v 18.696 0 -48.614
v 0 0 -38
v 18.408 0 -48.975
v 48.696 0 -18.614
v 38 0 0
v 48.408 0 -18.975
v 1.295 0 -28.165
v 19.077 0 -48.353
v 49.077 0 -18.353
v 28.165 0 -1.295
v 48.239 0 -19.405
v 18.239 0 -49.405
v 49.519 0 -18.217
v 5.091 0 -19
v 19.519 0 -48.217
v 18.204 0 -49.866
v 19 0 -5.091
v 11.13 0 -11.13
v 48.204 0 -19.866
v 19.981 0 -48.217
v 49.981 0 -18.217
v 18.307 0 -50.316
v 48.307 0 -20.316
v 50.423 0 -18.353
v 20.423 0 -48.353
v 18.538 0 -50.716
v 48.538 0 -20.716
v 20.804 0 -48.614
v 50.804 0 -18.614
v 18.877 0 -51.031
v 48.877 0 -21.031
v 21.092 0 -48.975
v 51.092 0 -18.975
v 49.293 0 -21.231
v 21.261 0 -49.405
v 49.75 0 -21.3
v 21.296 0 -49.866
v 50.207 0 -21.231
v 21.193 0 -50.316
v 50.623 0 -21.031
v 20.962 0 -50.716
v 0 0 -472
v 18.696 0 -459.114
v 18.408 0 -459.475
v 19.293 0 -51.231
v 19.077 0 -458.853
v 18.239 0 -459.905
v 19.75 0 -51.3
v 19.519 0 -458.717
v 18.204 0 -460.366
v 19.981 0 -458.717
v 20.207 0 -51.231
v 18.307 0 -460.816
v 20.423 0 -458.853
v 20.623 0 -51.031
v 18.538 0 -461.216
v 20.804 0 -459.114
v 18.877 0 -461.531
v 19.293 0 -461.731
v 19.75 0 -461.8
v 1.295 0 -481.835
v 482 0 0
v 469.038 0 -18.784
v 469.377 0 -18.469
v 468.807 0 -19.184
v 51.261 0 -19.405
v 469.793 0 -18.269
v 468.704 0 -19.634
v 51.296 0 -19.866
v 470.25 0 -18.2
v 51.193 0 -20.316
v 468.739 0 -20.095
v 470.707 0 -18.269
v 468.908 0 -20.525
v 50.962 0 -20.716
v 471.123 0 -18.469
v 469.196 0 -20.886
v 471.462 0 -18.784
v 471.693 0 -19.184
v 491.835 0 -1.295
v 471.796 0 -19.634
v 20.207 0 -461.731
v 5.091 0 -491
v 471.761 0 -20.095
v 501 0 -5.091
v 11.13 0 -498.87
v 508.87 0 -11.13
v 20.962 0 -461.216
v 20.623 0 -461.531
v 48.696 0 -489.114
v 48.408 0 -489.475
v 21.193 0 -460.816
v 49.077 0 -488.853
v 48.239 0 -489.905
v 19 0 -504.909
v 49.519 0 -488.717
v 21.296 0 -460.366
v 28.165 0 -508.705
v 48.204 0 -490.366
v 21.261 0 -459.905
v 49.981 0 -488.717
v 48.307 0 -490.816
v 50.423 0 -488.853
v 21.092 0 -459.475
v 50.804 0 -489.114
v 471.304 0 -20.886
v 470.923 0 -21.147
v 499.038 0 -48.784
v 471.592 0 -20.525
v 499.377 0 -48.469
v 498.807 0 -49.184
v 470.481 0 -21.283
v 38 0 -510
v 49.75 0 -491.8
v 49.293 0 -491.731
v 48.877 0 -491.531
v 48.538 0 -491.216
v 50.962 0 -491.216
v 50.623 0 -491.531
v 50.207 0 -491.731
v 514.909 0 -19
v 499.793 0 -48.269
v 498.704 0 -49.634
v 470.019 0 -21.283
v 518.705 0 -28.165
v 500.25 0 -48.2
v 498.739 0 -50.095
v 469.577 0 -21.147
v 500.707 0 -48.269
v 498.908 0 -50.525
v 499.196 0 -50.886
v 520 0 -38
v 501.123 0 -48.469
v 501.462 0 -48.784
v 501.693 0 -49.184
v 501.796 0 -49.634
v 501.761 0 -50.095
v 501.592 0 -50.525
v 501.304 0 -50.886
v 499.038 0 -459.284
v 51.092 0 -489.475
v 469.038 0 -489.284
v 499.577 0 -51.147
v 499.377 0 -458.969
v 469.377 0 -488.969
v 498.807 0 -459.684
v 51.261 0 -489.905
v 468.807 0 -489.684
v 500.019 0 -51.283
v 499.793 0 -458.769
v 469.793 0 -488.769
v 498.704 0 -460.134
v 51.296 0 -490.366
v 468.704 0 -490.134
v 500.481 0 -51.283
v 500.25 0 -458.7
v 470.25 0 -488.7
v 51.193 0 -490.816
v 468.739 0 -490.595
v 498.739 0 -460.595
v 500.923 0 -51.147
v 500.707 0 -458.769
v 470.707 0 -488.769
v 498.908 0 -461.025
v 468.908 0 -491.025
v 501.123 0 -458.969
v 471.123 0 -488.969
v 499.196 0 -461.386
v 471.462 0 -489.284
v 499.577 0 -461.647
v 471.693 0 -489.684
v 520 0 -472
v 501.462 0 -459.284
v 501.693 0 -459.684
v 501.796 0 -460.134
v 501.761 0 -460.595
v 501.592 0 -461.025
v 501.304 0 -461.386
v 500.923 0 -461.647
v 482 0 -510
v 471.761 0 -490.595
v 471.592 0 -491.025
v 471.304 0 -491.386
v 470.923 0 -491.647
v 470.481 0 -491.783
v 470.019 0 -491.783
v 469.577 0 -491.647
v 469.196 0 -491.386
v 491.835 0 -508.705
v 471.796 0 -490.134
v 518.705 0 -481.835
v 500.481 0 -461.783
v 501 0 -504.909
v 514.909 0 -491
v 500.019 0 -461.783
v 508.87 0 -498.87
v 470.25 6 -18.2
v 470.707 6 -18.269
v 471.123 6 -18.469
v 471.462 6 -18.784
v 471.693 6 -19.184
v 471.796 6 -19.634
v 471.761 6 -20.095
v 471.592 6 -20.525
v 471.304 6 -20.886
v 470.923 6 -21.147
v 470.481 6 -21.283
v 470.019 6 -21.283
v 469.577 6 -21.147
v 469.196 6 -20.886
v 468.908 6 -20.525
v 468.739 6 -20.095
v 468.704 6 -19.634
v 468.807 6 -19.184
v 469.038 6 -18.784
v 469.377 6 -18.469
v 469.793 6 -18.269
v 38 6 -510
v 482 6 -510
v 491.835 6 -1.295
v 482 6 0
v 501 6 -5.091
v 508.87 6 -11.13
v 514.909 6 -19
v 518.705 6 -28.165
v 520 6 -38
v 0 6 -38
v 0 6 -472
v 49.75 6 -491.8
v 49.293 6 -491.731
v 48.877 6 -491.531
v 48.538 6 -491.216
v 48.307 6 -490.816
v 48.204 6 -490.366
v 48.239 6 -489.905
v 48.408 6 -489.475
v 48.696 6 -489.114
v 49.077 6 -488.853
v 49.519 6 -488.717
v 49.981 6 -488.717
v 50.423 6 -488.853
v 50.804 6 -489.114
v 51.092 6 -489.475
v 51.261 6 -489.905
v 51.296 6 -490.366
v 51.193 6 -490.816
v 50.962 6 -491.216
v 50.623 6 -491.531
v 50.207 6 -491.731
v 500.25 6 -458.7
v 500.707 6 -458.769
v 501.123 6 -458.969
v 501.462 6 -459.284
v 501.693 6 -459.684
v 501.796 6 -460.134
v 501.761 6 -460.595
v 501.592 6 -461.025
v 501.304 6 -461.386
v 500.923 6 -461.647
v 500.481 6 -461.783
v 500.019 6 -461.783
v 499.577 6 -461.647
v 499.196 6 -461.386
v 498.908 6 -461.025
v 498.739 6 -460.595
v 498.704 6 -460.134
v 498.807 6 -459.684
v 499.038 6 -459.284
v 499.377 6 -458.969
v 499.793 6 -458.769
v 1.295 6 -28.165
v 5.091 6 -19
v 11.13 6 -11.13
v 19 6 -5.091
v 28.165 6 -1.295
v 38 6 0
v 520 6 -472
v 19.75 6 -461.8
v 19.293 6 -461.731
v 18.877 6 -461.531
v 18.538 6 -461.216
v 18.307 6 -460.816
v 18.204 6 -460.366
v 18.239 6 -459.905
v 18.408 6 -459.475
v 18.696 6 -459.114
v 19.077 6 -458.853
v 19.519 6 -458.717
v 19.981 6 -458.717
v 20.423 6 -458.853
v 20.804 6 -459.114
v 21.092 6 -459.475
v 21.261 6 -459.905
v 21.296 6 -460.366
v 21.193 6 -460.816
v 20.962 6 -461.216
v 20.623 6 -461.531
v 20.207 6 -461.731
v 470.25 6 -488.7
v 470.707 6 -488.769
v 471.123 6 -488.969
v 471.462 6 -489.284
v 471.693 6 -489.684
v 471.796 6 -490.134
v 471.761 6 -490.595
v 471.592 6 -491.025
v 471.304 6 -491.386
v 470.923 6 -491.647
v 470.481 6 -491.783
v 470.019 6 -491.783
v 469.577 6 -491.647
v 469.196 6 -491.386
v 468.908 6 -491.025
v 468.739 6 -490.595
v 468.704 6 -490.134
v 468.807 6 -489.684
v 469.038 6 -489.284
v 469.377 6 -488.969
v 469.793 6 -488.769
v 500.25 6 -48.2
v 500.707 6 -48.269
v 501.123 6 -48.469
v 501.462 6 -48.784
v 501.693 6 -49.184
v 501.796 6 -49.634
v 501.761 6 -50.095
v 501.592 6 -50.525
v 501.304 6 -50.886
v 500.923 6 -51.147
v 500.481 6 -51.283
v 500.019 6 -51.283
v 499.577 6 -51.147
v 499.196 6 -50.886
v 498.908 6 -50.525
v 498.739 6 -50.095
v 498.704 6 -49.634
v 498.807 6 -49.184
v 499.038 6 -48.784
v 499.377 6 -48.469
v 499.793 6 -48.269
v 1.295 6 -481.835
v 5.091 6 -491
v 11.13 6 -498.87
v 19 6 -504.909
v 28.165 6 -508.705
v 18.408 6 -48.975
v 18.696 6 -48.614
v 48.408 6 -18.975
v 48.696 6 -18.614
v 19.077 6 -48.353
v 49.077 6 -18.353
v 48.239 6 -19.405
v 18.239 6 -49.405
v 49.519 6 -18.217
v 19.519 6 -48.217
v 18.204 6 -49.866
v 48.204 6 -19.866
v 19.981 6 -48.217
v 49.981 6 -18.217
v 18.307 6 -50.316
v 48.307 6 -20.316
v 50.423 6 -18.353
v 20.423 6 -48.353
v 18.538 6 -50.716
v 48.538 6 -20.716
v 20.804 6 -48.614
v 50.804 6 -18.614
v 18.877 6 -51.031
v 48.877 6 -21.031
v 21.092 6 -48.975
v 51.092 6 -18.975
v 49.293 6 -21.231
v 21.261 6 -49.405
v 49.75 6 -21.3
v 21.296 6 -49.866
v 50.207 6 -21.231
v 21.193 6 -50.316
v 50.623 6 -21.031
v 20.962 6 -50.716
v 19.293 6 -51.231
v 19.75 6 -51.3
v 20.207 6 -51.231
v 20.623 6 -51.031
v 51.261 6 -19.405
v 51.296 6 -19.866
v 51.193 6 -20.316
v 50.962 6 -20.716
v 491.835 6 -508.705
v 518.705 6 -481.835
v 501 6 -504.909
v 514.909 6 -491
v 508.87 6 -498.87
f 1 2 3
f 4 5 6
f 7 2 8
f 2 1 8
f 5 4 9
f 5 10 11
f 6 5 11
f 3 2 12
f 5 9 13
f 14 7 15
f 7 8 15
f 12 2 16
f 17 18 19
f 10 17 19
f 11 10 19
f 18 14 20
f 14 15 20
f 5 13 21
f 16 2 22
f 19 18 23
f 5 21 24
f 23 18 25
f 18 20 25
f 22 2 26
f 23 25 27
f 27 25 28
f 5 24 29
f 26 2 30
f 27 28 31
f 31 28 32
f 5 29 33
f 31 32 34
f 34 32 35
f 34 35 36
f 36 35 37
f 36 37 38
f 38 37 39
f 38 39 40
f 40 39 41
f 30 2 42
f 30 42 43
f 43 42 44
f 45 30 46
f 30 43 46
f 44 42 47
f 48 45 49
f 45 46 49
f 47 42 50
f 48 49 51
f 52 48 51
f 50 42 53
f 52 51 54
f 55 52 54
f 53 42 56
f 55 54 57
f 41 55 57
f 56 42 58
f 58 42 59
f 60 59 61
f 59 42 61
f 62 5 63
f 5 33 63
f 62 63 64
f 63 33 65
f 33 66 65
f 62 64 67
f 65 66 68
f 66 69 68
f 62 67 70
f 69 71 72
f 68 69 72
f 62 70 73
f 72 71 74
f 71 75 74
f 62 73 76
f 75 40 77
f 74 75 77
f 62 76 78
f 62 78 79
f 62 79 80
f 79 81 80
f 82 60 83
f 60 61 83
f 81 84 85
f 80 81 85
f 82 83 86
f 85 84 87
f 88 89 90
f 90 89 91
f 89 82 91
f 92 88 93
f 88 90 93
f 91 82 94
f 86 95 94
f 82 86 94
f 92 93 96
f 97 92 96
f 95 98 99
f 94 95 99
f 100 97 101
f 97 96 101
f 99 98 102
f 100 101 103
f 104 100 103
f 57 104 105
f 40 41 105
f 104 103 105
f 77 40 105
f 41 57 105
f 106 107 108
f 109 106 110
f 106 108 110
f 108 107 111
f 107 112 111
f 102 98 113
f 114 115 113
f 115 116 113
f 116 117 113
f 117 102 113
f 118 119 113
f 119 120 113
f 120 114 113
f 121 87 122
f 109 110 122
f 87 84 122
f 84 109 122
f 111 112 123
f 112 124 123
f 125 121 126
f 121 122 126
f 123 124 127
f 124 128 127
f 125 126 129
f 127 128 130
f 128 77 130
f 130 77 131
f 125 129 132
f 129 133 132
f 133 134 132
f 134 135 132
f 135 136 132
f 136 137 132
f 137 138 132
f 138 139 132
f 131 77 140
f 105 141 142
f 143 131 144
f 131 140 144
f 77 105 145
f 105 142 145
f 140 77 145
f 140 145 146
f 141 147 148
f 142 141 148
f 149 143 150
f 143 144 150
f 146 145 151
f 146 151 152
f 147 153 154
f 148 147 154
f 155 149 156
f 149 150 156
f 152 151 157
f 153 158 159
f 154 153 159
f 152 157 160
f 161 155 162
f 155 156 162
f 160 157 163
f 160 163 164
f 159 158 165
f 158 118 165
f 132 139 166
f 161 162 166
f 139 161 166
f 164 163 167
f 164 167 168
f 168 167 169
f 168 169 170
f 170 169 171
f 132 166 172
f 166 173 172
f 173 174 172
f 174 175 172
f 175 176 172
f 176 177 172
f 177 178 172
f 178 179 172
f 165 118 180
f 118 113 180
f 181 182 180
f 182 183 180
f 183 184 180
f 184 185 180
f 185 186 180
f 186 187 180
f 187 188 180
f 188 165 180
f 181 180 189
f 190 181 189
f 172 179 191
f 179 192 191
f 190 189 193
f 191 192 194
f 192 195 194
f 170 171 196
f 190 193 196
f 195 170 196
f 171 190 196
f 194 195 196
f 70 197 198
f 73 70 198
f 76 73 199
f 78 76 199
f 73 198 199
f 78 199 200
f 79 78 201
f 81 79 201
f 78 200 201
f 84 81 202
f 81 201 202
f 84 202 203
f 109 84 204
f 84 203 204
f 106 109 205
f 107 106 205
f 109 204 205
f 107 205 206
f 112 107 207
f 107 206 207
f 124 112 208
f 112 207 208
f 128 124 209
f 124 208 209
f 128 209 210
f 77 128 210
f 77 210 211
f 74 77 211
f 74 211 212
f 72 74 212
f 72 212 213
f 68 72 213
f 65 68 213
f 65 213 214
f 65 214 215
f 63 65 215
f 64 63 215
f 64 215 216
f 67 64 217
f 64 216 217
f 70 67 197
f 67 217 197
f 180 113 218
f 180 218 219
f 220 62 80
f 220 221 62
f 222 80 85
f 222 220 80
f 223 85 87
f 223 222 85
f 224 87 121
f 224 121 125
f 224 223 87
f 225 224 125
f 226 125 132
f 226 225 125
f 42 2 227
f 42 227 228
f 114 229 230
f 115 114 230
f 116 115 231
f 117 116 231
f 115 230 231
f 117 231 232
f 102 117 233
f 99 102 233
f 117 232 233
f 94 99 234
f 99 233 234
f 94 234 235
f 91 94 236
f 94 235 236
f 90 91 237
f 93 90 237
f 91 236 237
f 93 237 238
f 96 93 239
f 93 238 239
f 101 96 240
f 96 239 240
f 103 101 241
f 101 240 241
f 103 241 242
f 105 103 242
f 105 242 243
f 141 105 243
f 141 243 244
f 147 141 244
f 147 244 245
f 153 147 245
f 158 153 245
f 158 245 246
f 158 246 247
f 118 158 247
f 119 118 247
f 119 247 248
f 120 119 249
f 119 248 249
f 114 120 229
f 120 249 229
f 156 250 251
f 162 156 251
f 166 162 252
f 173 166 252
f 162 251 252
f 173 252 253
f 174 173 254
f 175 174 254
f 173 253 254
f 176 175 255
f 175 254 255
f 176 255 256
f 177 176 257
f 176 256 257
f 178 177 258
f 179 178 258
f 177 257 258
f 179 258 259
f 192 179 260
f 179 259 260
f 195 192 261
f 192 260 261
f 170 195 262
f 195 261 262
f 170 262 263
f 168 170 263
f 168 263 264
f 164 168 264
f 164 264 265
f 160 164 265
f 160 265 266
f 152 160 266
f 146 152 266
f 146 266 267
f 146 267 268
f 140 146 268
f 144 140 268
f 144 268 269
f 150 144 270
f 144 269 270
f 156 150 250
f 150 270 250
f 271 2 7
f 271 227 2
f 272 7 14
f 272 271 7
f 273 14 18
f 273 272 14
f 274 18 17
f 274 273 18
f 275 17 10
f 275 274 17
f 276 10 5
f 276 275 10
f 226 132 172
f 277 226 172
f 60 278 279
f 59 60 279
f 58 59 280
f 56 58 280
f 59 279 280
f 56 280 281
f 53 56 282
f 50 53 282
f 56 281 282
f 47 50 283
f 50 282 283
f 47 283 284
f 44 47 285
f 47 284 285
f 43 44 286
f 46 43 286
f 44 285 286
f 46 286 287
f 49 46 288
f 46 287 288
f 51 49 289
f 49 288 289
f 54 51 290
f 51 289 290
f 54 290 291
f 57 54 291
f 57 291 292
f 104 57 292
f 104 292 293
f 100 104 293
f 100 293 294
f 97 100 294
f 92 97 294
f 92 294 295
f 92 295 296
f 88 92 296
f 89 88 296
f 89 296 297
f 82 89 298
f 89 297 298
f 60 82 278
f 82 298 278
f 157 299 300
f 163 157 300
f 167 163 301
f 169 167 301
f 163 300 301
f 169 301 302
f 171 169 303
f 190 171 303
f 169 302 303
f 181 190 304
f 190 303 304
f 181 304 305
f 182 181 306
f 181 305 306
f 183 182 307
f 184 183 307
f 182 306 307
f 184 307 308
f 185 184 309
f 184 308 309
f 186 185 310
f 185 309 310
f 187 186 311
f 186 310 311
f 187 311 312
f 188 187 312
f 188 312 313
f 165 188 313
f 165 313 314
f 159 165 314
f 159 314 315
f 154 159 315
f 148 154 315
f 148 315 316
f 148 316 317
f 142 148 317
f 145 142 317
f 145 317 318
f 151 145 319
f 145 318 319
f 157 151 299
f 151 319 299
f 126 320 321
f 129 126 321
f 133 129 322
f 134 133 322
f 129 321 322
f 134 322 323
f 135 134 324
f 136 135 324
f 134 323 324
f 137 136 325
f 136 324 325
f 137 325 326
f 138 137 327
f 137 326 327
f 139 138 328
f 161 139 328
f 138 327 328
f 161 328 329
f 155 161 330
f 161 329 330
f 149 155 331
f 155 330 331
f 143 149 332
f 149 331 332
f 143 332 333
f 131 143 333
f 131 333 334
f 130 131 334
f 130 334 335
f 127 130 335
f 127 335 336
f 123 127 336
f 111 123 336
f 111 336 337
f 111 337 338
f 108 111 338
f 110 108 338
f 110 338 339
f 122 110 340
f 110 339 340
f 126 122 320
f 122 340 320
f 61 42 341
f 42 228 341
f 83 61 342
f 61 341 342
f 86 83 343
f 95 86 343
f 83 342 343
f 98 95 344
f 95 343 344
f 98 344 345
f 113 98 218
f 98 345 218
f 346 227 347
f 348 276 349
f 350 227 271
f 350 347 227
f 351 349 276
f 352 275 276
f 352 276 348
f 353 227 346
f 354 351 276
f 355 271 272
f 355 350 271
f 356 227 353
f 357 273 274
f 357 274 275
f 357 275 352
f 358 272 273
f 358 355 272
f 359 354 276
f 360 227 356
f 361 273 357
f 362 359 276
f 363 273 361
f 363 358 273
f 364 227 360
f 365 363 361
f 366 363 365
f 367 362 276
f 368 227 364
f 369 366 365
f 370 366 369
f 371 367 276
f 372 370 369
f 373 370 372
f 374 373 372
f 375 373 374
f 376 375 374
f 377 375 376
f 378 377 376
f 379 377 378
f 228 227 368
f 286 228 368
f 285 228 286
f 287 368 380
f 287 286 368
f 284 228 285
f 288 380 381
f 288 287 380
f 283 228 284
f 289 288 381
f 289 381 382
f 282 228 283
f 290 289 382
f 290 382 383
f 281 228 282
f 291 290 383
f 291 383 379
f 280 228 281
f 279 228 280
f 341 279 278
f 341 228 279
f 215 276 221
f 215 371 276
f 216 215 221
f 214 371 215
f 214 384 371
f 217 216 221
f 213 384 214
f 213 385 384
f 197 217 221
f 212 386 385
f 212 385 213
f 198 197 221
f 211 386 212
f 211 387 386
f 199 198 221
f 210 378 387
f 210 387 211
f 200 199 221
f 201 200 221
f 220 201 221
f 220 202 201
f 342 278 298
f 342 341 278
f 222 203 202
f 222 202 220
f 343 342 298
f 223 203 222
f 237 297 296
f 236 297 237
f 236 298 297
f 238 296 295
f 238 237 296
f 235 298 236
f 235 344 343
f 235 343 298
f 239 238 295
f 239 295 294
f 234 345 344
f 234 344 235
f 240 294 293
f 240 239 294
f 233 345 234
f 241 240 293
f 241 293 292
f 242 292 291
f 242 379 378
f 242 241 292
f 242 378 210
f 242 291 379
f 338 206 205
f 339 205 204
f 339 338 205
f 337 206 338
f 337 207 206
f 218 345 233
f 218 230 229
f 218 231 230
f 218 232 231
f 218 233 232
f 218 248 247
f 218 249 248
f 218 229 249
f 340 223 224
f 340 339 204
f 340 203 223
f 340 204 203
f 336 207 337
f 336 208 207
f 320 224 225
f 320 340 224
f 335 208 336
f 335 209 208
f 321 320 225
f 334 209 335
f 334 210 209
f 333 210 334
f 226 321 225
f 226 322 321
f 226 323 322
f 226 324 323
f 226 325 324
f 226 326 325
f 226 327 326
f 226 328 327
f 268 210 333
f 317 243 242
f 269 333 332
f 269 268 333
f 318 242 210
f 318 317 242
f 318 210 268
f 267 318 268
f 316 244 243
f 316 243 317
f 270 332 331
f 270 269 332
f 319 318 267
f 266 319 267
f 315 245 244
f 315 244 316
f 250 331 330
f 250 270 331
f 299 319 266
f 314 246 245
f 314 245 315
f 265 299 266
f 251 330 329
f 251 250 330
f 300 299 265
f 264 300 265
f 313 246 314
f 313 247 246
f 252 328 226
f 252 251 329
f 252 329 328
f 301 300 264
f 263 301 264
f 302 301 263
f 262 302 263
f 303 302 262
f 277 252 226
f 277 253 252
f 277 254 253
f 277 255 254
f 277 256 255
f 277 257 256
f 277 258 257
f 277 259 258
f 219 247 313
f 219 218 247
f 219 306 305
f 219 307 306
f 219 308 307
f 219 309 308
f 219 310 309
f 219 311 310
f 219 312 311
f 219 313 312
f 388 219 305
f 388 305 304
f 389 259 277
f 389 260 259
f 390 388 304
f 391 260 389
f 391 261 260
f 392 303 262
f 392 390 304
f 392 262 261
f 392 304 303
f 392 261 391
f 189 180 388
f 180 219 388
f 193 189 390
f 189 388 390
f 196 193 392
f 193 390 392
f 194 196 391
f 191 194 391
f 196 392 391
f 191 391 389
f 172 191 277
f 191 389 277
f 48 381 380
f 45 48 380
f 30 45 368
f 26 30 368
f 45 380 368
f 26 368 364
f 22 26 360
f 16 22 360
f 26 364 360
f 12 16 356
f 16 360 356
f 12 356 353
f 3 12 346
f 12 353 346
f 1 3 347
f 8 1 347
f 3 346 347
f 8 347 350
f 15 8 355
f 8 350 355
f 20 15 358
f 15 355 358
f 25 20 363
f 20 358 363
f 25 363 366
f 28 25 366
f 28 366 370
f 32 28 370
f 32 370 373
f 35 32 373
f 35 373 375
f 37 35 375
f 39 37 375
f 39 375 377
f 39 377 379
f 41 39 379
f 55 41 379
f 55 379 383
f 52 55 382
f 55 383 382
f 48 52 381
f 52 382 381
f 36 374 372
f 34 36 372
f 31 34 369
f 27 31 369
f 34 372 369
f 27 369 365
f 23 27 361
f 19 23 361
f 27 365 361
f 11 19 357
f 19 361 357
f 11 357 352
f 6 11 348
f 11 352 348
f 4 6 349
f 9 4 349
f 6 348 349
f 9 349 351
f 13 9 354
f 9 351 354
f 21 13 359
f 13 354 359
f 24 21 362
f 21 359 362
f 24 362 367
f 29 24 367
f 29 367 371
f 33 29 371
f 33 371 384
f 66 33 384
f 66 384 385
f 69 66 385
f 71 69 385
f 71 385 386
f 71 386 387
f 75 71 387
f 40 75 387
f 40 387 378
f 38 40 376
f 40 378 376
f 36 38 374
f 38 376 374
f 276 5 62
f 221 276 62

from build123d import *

# Parameters (mm, degrees)
CROQUIS1_W              = 520
CROQUIS1_H              = 510
SALIENTE_EXTRUIR1_DEPTH = 6
CROQUIS2_R              = 1.55
CORTAR_EXTRUIR1_DEPTH   = 6
REDONDEO1_R             = 38


with BuildPart() as part:
    # Croquis1 → Saliente-Extruir1 (new body)
    with BuildSketch(Plane(origin=(0, 0, 0), x_dir=(1, 0, 0), z_dir=(0, 1, 0))):
        with Locations((260, 255)):
            Rectangle(CROQUIS1_W, CROQUIS1_H)
    extrude(amount=SALIENTE_EXTRUIR1_DEPTH)

    # Croquis2 → Cortar-Extruir1 (cut)
    with BuildSketch(Plane(origin=(0, 6, 0), x_dir=(1, 0, 0), z_dir=(0, 1, 0))):
        with Locations(Location((470.25, 490.25, 0), (0, 0, 270))):
            Circle(CROQUIS2_R)
        with Locations(Location((500.25, 460.25, 0), (0, 0, 270))):
            Circle(CROQUIS2_R)
        with Locations(Location((500.25, 49.75, 0), (0, 0, 270))):
            Circle(CROQUIS2_R)
        with Locations(Location((19.75, 460.25, 0), (0, 0, 90))):
            Circle(CROQUIS2_R)
        with Locations(Location((19.75, 49.75, 0), (0, 0, 90))):
            Circle(CROQUIS2_R)
        with Locations(Location((470.25, 19.75, 0), (0, 0, 270))):
            Circle(CROQUIS2_R)
        with Locations(Location((49.75, 490.25, 0), (0, 0, 90))):
            Circle(CROQUIS2_R)
        with Locations(Location((49.75, 19.75, 0), (0, 0, 90))):
            Circle(CROQUIS2_R)
    extrude(amount=-CORTAR_EXTRUIR1_DEPTH, mode=Mode.SUBTRACT)

    # Redondeo1
    redondeo1_edges = [part.edges().sort_by_distance(p)[0] for p in [
        (0, 3, -510),
        (520, 3, -510),
        (520, 3, 0),
        (0, 3, 0),
    ]]
    fillet(redondeo1_edges, radius=REDONDEO1_R)


solid = part.part
